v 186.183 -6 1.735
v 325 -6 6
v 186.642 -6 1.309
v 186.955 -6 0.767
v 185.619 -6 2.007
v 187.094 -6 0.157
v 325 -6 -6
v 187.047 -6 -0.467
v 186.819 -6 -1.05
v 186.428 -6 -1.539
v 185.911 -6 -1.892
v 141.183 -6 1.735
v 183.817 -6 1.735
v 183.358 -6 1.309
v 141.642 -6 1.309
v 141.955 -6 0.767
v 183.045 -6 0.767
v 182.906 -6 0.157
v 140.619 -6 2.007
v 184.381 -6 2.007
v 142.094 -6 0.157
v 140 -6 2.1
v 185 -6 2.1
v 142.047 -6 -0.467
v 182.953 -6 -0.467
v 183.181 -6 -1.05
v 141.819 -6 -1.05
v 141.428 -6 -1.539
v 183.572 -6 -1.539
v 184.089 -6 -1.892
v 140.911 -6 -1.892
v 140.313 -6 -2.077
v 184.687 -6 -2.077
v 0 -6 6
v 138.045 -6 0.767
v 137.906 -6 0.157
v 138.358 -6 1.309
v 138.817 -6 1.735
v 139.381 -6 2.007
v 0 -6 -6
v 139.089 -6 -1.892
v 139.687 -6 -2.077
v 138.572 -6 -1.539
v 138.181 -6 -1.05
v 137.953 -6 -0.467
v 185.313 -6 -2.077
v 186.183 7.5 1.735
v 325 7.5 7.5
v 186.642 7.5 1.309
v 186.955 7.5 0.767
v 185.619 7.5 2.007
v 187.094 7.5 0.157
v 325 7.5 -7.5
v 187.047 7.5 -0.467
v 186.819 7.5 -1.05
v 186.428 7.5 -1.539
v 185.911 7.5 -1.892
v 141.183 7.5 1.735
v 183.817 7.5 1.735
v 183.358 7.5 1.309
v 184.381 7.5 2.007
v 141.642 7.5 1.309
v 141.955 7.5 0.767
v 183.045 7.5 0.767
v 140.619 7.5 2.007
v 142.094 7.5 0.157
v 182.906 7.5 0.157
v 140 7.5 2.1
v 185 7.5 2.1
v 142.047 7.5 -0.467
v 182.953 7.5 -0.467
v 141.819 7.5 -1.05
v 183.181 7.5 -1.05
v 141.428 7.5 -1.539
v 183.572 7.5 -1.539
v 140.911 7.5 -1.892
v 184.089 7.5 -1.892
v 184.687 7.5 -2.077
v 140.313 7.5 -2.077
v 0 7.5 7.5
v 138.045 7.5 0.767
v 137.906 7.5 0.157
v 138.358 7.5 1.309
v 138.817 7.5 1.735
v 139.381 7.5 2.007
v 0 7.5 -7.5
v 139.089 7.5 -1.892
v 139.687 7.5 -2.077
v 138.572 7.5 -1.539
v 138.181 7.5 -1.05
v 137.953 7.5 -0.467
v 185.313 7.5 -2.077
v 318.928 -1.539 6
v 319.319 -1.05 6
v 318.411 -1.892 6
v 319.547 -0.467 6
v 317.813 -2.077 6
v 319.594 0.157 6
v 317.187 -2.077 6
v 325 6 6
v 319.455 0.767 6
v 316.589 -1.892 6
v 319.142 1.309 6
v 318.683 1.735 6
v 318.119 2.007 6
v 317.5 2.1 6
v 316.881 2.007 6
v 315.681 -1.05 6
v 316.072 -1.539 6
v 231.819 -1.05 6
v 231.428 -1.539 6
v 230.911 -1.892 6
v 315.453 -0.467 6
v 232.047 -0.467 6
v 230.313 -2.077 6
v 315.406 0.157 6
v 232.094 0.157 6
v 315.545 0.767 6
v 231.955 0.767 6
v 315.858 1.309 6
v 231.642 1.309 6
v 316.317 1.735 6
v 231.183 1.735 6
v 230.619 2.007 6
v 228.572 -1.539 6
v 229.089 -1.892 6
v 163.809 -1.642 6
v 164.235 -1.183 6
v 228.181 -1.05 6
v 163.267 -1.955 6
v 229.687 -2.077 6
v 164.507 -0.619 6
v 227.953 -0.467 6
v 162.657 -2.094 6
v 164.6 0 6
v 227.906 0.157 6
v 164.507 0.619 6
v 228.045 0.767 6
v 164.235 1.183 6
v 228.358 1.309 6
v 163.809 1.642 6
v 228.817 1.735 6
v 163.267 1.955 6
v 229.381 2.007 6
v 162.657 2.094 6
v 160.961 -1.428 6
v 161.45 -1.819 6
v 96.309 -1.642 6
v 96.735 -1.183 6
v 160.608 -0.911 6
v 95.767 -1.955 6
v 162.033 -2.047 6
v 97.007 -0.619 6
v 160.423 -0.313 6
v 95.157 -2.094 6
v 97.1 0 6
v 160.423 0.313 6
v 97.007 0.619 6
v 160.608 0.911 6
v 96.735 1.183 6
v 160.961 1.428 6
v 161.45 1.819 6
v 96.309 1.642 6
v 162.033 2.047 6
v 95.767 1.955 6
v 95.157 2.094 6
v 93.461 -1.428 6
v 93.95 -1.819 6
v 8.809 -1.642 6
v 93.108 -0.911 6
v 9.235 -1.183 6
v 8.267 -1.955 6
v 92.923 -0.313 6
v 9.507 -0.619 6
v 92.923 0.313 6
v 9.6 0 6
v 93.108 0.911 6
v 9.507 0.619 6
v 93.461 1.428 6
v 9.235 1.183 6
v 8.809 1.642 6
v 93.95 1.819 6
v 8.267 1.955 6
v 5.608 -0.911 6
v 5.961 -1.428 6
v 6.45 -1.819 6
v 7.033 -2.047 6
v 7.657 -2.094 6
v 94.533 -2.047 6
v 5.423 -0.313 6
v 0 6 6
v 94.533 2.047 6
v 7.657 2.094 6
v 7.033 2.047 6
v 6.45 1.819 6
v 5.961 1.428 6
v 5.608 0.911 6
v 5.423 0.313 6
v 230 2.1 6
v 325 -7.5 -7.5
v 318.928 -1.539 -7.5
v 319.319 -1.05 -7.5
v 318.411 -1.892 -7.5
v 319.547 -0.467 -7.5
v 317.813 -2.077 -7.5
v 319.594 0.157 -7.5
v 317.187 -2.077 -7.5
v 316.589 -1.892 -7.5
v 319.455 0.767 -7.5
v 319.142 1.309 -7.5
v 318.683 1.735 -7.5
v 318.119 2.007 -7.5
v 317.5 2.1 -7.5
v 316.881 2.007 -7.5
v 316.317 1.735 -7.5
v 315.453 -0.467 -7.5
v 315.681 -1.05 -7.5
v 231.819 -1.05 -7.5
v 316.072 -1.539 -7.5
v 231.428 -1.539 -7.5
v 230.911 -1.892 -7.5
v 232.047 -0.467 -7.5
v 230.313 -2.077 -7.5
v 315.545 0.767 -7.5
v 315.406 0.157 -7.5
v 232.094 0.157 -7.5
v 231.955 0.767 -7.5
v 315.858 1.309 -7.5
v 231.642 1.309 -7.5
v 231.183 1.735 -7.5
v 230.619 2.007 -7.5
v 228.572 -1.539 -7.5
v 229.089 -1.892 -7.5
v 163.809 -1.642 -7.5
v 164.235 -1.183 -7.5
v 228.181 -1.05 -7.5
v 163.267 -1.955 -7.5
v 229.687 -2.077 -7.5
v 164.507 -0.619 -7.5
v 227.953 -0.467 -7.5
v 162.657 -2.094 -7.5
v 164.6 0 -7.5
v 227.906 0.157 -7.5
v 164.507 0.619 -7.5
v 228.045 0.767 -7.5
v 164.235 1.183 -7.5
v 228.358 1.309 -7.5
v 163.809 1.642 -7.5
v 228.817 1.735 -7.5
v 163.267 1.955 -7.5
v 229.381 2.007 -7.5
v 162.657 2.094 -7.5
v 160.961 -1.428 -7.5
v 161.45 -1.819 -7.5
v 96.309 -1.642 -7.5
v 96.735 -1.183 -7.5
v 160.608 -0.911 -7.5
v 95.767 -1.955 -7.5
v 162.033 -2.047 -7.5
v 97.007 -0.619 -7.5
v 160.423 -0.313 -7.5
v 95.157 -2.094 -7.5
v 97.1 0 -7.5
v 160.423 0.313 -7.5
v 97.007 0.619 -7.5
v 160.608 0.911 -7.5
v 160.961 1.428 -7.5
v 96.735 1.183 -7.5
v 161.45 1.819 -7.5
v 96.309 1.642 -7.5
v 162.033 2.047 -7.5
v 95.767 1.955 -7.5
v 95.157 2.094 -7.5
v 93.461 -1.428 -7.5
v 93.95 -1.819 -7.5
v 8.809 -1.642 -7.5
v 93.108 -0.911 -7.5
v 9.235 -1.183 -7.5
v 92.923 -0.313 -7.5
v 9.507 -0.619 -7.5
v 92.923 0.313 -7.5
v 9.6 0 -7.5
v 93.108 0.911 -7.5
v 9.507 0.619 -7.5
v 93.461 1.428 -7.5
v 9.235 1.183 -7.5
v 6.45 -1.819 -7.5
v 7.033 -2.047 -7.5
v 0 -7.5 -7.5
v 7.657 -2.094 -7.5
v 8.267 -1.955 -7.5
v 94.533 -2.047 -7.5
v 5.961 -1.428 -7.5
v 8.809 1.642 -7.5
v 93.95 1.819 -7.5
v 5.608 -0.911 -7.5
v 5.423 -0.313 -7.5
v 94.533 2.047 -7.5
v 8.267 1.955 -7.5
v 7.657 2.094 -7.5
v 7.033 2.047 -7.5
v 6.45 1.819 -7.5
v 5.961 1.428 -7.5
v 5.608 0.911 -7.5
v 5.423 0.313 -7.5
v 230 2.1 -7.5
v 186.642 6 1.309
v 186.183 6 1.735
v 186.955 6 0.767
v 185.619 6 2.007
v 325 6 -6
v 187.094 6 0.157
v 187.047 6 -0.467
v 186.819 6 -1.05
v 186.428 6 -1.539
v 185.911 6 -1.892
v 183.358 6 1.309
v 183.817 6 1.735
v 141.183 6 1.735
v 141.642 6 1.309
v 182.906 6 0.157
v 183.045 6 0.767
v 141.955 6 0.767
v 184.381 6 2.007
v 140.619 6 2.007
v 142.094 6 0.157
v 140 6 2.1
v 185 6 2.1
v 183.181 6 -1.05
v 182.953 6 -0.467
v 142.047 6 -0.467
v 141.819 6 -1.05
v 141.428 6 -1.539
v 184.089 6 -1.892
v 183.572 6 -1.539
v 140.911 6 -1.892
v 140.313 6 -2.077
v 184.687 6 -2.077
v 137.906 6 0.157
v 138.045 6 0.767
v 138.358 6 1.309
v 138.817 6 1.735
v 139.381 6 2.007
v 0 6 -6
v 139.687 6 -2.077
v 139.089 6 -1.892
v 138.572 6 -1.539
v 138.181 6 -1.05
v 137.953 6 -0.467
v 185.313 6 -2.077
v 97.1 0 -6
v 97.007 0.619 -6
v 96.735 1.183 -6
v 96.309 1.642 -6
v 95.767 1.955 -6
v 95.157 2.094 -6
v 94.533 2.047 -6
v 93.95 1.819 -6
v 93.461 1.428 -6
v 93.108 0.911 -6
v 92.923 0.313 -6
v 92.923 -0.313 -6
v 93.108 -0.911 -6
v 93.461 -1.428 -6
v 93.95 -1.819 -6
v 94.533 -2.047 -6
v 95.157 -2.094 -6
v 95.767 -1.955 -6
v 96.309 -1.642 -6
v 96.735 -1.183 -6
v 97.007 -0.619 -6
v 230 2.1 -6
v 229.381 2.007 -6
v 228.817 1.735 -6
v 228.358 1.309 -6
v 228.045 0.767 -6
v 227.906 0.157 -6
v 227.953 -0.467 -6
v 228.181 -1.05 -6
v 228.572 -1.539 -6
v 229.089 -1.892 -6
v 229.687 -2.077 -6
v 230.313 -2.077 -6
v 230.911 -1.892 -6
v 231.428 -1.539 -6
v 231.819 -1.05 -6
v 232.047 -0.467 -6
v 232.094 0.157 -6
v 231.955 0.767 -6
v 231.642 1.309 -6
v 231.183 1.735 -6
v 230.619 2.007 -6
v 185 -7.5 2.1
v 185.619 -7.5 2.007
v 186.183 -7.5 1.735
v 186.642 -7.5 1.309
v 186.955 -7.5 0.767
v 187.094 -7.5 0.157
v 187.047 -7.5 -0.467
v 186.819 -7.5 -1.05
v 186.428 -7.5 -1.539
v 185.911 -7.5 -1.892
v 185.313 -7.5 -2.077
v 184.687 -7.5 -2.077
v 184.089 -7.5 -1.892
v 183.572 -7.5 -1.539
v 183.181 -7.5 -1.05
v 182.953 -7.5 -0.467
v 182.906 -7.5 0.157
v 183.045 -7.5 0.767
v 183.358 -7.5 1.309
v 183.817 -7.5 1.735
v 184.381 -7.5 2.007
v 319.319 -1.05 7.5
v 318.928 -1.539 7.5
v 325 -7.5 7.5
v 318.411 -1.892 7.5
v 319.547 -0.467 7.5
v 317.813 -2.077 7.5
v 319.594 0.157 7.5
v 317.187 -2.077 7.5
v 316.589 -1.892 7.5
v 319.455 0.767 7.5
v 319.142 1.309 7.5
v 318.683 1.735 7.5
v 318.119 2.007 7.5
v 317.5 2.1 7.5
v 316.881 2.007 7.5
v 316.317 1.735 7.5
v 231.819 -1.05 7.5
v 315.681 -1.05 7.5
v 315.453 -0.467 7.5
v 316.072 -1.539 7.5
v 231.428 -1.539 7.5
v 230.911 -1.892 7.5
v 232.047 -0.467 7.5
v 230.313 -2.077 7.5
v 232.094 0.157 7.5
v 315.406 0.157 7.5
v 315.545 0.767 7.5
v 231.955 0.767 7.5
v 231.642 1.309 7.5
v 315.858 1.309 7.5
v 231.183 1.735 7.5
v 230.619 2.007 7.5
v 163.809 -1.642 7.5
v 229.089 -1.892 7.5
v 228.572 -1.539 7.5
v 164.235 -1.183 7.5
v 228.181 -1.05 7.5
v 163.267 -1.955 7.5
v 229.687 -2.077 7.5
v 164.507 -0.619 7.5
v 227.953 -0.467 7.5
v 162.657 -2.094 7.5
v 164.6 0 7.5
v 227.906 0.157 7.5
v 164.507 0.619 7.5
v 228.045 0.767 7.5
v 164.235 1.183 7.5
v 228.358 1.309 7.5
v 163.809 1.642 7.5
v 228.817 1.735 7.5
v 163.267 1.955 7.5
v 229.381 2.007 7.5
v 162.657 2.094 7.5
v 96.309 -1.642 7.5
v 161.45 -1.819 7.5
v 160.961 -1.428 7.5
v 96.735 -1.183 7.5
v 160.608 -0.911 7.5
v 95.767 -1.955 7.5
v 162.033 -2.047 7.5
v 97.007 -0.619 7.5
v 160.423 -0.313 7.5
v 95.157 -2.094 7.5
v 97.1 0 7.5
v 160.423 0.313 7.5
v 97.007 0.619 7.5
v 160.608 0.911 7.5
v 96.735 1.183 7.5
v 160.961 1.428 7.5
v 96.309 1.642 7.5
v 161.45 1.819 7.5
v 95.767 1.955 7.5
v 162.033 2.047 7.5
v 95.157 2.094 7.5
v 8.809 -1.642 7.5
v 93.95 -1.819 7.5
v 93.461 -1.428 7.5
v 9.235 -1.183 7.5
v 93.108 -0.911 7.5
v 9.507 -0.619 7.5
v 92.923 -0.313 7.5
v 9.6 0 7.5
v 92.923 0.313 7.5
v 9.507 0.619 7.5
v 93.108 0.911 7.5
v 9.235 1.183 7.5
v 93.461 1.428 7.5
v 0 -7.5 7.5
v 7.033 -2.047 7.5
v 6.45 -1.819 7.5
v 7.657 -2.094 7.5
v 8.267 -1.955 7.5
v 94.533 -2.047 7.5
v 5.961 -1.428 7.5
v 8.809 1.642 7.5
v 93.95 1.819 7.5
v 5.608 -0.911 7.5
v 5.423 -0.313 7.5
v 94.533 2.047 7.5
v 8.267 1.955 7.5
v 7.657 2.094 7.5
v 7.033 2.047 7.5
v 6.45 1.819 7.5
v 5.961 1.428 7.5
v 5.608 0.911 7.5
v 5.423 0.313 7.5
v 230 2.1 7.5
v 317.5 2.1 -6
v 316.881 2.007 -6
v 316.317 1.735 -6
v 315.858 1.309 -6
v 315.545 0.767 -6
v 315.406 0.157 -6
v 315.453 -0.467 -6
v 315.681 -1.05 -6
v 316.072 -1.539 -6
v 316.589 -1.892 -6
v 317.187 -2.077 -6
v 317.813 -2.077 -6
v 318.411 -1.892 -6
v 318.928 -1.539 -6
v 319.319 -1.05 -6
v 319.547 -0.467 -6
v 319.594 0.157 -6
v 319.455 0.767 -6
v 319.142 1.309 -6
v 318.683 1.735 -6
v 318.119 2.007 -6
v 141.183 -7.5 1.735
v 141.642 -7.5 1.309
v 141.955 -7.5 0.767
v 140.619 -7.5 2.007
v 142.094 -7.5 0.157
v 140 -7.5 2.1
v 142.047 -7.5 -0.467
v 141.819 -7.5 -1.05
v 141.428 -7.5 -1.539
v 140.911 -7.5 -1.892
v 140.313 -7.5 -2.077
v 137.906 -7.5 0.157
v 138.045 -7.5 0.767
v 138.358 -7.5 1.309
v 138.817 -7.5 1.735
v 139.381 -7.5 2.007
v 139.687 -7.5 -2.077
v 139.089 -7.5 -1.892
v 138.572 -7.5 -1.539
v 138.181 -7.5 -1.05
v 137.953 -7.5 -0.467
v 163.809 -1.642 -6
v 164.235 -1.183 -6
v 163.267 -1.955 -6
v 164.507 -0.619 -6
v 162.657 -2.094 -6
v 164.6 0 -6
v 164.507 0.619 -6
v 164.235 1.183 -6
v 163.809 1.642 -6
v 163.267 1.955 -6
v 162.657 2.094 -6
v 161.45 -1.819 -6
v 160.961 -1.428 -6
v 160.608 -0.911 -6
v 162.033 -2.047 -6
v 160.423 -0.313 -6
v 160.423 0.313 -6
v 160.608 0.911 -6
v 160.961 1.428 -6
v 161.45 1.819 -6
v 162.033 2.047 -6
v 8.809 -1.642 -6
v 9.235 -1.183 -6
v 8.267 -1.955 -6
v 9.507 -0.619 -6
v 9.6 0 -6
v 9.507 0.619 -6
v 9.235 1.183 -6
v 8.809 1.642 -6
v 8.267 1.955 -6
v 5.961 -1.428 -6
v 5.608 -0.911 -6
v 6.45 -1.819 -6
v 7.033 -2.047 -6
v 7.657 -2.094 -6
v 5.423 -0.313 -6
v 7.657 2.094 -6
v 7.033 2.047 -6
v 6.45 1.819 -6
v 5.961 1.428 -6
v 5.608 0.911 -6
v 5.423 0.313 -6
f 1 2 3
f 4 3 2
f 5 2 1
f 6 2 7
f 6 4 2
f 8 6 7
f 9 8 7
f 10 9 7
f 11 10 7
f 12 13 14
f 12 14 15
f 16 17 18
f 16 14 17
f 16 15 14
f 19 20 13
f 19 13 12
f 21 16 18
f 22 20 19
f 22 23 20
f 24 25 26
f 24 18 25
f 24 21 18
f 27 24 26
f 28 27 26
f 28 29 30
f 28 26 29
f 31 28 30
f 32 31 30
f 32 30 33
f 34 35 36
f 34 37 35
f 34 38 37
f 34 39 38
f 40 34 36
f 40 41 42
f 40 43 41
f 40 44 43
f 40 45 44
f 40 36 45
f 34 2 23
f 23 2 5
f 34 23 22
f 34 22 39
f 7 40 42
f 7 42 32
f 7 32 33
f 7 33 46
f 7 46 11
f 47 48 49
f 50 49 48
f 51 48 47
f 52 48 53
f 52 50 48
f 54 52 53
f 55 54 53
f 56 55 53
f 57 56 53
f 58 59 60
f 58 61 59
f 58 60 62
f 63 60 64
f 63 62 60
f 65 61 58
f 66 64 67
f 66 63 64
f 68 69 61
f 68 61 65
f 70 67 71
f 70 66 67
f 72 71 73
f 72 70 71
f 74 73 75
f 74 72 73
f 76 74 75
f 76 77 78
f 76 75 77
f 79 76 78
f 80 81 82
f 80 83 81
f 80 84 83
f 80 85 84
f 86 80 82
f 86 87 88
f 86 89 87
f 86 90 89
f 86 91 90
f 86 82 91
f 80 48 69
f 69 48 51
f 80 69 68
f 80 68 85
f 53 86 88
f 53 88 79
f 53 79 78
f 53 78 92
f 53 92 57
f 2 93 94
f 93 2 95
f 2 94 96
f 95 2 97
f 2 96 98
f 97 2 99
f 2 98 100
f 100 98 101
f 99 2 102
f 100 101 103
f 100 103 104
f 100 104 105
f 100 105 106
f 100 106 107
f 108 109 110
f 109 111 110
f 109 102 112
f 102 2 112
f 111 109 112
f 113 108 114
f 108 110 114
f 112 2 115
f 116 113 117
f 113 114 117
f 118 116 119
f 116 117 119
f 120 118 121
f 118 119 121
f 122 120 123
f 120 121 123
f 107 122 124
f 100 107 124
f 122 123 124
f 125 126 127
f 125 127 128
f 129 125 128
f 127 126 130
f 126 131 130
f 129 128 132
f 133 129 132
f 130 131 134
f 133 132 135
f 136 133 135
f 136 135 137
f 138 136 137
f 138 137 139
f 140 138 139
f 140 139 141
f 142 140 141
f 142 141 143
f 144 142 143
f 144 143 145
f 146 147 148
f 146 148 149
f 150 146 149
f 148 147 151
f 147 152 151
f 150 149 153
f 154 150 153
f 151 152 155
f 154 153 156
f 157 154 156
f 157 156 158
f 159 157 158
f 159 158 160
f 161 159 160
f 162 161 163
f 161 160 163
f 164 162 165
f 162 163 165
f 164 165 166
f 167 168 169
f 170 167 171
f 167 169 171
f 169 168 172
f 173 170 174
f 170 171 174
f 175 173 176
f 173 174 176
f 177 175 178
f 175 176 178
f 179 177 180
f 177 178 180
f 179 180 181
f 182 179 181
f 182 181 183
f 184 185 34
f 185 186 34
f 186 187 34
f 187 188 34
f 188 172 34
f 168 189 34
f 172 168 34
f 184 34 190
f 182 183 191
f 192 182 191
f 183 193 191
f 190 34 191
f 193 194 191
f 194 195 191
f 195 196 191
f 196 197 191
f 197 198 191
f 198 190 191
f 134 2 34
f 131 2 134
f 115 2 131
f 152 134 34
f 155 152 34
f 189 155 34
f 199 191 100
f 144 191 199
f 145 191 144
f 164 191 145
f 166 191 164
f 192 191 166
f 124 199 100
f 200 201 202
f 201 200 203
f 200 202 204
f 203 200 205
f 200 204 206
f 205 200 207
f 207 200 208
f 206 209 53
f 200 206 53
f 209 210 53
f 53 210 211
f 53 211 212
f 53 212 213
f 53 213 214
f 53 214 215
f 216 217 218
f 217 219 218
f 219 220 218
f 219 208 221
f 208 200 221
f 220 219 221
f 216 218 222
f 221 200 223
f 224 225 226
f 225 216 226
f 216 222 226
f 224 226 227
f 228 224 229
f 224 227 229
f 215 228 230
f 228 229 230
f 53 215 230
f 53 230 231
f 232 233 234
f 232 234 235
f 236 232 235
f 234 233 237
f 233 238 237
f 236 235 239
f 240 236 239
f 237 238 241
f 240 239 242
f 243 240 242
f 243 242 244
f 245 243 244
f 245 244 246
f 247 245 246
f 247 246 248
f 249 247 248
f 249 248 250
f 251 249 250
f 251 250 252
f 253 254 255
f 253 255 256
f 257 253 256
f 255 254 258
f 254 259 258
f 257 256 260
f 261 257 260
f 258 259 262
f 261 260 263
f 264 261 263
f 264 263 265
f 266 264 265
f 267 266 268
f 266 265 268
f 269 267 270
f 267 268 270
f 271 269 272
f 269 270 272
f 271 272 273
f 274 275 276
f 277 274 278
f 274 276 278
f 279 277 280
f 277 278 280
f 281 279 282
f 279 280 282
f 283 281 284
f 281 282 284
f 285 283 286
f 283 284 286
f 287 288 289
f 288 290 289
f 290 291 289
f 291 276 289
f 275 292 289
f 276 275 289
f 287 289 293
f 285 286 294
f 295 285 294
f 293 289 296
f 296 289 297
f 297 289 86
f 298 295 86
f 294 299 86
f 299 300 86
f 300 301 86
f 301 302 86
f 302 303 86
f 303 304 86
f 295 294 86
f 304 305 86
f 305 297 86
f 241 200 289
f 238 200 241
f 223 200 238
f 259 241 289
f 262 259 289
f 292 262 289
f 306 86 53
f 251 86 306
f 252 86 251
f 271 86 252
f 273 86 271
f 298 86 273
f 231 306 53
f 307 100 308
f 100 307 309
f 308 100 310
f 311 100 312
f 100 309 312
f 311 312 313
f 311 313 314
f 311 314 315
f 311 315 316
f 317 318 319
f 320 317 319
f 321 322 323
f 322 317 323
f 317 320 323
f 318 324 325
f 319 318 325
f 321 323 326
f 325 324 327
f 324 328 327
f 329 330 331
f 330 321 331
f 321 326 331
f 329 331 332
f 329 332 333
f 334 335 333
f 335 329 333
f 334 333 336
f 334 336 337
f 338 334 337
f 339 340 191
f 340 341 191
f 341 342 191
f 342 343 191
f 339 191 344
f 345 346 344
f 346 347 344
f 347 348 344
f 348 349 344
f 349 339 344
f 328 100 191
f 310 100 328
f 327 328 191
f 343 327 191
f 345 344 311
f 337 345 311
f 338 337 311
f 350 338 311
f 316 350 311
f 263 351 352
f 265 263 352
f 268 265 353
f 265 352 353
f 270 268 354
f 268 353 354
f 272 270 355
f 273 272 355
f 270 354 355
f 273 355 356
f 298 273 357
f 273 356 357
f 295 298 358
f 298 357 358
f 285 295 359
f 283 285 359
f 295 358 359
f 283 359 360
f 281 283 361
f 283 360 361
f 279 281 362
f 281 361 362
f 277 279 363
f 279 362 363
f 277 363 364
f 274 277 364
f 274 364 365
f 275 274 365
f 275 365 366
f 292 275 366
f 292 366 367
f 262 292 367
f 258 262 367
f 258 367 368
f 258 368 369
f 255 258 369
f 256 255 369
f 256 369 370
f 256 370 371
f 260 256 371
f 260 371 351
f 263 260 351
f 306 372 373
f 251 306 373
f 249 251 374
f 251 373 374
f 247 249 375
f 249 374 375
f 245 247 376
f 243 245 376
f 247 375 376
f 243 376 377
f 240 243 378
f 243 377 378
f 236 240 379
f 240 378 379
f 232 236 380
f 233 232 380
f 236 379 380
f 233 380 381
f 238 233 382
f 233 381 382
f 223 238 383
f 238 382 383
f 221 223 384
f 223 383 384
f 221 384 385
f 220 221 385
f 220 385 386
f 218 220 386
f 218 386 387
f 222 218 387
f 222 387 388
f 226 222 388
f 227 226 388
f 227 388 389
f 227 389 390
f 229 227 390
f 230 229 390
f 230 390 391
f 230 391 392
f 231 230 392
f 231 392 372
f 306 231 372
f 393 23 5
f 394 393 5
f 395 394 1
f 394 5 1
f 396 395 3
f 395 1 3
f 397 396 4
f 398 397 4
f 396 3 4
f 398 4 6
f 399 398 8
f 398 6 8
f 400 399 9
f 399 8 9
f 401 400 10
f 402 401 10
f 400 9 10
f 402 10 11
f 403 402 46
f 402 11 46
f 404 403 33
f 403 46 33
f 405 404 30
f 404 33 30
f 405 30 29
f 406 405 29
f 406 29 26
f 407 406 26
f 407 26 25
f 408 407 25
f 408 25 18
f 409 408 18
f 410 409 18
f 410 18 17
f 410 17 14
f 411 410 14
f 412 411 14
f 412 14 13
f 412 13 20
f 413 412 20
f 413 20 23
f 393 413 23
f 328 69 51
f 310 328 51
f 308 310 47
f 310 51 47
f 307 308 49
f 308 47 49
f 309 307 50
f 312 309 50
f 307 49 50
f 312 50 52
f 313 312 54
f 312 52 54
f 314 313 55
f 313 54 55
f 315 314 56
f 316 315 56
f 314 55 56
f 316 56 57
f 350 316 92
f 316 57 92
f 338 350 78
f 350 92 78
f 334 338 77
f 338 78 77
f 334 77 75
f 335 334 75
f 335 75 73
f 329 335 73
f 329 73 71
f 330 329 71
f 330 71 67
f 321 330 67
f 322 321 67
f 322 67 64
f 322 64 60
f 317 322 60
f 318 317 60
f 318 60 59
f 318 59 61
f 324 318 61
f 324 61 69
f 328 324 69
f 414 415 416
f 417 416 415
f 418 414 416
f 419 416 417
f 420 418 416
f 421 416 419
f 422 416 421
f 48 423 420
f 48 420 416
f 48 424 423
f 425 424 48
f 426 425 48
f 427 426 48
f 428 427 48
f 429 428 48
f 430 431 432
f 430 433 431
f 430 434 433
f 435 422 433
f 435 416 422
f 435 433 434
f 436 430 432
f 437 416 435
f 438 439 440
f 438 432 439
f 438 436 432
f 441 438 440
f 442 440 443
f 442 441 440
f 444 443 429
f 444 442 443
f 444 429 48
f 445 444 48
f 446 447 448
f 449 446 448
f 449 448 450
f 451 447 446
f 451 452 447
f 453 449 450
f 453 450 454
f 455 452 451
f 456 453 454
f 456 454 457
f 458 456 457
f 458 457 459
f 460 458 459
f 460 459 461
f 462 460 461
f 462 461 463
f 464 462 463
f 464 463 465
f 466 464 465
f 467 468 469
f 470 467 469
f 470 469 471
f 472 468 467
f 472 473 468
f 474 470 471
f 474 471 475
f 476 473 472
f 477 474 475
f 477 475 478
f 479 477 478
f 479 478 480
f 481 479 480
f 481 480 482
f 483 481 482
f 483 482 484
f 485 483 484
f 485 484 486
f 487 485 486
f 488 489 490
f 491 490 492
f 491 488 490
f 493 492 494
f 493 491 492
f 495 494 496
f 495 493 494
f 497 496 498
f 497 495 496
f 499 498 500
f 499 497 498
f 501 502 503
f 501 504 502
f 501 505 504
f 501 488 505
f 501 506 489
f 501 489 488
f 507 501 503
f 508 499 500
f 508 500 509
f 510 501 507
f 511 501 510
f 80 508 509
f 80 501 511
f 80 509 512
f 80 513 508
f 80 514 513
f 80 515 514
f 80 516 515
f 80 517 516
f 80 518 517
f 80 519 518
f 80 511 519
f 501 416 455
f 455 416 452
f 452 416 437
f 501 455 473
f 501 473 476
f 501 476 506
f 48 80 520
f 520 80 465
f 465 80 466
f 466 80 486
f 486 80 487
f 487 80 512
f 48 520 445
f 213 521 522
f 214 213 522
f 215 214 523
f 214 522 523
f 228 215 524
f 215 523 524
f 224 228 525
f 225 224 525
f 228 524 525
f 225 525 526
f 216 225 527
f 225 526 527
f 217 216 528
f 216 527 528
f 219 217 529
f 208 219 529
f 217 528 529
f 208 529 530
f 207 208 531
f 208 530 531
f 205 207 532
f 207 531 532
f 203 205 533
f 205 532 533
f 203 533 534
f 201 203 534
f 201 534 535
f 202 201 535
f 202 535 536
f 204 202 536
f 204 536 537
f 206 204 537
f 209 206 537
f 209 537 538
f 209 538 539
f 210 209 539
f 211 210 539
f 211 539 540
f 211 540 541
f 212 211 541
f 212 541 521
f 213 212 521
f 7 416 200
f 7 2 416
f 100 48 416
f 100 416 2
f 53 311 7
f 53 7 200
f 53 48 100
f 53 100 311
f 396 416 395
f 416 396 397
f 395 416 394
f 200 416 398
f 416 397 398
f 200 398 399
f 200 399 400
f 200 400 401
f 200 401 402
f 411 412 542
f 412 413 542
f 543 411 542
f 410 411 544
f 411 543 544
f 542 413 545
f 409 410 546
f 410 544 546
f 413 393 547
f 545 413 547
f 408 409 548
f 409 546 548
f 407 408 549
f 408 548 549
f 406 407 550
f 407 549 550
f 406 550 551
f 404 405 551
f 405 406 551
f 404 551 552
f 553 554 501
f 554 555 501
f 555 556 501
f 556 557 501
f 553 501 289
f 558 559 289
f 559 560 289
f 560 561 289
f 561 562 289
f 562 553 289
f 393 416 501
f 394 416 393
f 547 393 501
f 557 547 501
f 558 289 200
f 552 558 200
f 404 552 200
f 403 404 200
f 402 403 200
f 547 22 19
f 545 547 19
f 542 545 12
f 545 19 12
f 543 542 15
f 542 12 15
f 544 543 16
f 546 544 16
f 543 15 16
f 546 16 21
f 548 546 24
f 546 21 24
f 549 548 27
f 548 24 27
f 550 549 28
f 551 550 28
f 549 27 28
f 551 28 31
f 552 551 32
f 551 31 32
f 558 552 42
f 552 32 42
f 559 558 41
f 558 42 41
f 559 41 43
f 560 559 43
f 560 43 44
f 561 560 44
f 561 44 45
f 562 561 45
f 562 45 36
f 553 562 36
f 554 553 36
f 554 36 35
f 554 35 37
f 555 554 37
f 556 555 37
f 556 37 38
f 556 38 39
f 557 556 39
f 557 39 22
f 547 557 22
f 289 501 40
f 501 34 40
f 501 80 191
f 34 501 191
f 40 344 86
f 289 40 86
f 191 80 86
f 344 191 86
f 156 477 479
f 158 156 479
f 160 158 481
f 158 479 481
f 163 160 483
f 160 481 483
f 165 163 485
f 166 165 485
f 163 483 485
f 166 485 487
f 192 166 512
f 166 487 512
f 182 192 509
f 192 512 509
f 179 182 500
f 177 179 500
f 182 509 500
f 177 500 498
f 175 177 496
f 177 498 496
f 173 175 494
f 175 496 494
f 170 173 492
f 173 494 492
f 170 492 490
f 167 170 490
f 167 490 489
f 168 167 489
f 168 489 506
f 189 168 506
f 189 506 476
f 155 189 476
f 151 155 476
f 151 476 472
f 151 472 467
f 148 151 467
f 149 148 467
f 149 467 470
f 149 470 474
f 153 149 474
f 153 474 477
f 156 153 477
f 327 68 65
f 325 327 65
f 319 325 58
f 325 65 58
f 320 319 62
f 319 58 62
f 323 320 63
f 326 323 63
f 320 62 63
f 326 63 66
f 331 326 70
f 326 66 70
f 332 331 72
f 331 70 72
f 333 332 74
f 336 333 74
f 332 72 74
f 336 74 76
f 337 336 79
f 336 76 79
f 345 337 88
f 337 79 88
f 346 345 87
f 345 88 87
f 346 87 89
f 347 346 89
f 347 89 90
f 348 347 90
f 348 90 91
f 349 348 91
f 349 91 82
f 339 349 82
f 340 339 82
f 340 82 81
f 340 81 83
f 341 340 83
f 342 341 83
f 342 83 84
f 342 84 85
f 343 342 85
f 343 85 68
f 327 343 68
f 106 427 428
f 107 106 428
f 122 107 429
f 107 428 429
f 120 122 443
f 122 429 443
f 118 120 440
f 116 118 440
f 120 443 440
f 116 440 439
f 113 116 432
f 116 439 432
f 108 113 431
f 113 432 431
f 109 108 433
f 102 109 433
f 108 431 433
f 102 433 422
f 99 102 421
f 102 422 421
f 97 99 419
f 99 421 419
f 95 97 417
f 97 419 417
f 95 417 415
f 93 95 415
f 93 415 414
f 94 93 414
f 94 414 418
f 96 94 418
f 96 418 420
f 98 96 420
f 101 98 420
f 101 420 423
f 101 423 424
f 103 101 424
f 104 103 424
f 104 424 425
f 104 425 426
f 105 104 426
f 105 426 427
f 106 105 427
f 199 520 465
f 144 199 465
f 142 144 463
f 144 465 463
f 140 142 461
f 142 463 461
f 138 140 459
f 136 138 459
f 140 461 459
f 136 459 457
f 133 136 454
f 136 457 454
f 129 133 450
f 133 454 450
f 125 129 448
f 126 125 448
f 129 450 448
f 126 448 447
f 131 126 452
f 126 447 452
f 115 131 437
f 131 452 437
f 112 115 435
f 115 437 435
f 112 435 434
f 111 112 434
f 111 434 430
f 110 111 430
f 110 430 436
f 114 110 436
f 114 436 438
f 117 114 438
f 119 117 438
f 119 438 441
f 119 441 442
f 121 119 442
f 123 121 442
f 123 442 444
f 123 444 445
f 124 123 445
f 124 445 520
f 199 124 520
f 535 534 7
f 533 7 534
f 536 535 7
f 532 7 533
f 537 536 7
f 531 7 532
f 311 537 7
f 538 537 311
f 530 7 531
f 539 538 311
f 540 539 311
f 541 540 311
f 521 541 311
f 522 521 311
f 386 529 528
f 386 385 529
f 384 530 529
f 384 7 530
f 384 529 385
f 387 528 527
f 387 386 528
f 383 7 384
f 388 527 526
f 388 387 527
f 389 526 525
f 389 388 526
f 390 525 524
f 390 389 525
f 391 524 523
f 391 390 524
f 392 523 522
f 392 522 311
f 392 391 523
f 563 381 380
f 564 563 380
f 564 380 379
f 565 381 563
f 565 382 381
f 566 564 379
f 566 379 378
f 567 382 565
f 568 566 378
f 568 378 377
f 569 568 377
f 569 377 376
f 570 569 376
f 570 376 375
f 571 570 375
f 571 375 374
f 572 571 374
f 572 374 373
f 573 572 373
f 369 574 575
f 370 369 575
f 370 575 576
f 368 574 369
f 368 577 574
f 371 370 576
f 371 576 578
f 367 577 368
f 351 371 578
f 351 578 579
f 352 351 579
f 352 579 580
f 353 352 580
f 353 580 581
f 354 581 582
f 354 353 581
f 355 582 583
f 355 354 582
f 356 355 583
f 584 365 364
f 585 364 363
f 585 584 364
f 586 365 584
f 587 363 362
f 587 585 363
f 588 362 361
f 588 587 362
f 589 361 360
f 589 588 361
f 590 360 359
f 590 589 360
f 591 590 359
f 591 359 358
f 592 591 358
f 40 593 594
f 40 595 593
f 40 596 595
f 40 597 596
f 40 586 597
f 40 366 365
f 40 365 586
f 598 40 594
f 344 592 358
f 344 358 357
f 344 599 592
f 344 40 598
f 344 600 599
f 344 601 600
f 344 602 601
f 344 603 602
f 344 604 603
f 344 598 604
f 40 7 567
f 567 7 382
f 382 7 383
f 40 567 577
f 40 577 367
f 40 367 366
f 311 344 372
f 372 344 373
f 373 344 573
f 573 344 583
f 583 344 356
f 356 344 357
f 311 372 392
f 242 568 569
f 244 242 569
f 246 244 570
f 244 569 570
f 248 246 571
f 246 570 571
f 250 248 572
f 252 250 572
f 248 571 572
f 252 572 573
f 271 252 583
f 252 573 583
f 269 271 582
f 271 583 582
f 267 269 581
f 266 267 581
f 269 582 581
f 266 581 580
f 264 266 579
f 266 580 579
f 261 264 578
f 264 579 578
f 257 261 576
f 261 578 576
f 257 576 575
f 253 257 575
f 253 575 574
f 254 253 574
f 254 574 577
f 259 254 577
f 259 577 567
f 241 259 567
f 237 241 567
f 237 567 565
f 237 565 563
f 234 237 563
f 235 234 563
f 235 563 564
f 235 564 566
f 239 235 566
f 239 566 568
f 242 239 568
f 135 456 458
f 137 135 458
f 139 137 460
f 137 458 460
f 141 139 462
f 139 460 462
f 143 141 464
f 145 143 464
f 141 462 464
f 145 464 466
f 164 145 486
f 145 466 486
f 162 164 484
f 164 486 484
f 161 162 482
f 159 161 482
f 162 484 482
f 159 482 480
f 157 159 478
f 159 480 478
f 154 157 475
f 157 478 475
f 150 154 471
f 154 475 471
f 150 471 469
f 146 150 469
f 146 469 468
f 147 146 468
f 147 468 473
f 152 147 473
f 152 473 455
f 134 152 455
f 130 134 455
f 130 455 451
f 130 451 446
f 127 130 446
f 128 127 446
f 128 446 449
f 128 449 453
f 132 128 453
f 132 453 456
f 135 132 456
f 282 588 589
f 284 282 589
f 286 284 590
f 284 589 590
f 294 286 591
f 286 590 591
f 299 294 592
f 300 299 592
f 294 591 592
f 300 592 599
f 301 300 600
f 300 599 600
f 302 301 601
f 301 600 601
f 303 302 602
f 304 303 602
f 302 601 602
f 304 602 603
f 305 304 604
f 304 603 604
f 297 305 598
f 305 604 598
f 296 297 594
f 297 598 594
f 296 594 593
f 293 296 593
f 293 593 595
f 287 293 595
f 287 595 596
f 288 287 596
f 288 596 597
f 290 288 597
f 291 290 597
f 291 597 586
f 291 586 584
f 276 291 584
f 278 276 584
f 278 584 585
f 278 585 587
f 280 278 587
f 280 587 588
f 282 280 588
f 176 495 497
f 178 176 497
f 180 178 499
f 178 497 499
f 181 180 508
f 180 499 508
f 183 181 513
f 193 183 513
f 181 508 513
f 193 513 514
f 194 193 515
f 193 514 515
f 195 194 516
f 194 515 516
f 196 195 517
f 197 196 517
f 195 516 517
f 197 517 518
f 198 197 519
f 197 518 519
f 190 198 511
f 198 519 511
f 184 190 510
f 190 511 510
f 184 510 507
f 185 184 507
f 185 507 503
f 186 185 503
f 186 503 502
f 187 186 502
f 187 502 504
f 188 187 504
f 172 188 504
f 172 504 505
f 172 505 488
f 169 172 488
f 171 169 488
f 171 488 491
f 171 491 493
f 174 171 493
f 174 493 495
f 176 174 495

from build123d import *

# Parameters (mm, degrees)
SKETCH_1_W          = 15
SKETCH_1_H          = 15
SKETCH_1_W_2        = 12
SKETCH_1_H_2        = 12
EXTRUDE_1_DEPTH     = 325
SKETCH_2_R          = 2.1
CUT_EXTRUDE_1_DEPTH = 326.432404656
SKETCH_3_R          = 2.1
CUT_EXTRUDE_2_DEPTH = 326.432404656
SKETCH_4_R          = 2.1
CUT_EXTRUDE_3_DEPTH = 326.432404656


with BuildPart() as part:
    # ｽｹｯﾁ1 → 押し出し-薄板1 (new body)
    with BuildSketch(Plane(origin=(0, 0, 0), x_dir=(0, 0, -1), z_dir=(1, 0, 0))):
        Rectangle(SKETCH_1_W, SKETCH_1_H)
        Rectangle(SKETCH_1_W_2, SKETCH_1_H_2, mode=Mode.SUBTRACT)
    extrude(amount=EXTRUDE_1_DEPTH)

    # ｽｹｯﾁ2 → ｶｯﾄ - 押し出し1 (cut, through all)
    with BuildSketch(Plane.XY.offset(7.5)):
        with Locations((7.5, 0)):
            Circle(SKETCH_2_R)
        with Locations(Location((317.5, 0, 0), (0, 0, 90))):
            Circle(SKETCH_2_R)
    extrude(amount=-CUT_EXTRUDE_1_DEPTH, mode=Mode.SUBTRACT)

    # ｽｹｯﾁ3 → ｶｯﾄ - 押し出し2 (cut, through all)
    with BuildSketch(Plane.XY.offset(7.5)):
        with Locations((95, 0)):
            Circle(SKETCH_3_R)
        with Locations(Location((230, 0, 0), (0, 0, 90))):
            Circle(SKETCH_3_R)
        with Locations((162.5, 0)):
            Circle(SKETCH_3_R)
    extrude(amount=-CUT_EXTRUDE_2_DEPTH, mode=Mode.SUBTRACT)

    # ｽｹｯﾁ4 → ｶｯﾄ - 押し出し3 (cut, through all)
    with BuildSketch(Plane(origin=(0, 7.5, 0), x_dir=(1, 0, 0), z_dir=(0, 1, 0))):
        with Locations(Location((140, 0, 0), (0, 0, 270))):
            Circle(SKETCH_4_R)
        with Locations(Location((185, 0, 0), (0, 0, 270))):
            Circle(SKETCH_4_R)
    extrude(amount=-CUT_EXTRUDE_3_DEPTH, mode=Mode.SUBTRACT)


solid = part.part
